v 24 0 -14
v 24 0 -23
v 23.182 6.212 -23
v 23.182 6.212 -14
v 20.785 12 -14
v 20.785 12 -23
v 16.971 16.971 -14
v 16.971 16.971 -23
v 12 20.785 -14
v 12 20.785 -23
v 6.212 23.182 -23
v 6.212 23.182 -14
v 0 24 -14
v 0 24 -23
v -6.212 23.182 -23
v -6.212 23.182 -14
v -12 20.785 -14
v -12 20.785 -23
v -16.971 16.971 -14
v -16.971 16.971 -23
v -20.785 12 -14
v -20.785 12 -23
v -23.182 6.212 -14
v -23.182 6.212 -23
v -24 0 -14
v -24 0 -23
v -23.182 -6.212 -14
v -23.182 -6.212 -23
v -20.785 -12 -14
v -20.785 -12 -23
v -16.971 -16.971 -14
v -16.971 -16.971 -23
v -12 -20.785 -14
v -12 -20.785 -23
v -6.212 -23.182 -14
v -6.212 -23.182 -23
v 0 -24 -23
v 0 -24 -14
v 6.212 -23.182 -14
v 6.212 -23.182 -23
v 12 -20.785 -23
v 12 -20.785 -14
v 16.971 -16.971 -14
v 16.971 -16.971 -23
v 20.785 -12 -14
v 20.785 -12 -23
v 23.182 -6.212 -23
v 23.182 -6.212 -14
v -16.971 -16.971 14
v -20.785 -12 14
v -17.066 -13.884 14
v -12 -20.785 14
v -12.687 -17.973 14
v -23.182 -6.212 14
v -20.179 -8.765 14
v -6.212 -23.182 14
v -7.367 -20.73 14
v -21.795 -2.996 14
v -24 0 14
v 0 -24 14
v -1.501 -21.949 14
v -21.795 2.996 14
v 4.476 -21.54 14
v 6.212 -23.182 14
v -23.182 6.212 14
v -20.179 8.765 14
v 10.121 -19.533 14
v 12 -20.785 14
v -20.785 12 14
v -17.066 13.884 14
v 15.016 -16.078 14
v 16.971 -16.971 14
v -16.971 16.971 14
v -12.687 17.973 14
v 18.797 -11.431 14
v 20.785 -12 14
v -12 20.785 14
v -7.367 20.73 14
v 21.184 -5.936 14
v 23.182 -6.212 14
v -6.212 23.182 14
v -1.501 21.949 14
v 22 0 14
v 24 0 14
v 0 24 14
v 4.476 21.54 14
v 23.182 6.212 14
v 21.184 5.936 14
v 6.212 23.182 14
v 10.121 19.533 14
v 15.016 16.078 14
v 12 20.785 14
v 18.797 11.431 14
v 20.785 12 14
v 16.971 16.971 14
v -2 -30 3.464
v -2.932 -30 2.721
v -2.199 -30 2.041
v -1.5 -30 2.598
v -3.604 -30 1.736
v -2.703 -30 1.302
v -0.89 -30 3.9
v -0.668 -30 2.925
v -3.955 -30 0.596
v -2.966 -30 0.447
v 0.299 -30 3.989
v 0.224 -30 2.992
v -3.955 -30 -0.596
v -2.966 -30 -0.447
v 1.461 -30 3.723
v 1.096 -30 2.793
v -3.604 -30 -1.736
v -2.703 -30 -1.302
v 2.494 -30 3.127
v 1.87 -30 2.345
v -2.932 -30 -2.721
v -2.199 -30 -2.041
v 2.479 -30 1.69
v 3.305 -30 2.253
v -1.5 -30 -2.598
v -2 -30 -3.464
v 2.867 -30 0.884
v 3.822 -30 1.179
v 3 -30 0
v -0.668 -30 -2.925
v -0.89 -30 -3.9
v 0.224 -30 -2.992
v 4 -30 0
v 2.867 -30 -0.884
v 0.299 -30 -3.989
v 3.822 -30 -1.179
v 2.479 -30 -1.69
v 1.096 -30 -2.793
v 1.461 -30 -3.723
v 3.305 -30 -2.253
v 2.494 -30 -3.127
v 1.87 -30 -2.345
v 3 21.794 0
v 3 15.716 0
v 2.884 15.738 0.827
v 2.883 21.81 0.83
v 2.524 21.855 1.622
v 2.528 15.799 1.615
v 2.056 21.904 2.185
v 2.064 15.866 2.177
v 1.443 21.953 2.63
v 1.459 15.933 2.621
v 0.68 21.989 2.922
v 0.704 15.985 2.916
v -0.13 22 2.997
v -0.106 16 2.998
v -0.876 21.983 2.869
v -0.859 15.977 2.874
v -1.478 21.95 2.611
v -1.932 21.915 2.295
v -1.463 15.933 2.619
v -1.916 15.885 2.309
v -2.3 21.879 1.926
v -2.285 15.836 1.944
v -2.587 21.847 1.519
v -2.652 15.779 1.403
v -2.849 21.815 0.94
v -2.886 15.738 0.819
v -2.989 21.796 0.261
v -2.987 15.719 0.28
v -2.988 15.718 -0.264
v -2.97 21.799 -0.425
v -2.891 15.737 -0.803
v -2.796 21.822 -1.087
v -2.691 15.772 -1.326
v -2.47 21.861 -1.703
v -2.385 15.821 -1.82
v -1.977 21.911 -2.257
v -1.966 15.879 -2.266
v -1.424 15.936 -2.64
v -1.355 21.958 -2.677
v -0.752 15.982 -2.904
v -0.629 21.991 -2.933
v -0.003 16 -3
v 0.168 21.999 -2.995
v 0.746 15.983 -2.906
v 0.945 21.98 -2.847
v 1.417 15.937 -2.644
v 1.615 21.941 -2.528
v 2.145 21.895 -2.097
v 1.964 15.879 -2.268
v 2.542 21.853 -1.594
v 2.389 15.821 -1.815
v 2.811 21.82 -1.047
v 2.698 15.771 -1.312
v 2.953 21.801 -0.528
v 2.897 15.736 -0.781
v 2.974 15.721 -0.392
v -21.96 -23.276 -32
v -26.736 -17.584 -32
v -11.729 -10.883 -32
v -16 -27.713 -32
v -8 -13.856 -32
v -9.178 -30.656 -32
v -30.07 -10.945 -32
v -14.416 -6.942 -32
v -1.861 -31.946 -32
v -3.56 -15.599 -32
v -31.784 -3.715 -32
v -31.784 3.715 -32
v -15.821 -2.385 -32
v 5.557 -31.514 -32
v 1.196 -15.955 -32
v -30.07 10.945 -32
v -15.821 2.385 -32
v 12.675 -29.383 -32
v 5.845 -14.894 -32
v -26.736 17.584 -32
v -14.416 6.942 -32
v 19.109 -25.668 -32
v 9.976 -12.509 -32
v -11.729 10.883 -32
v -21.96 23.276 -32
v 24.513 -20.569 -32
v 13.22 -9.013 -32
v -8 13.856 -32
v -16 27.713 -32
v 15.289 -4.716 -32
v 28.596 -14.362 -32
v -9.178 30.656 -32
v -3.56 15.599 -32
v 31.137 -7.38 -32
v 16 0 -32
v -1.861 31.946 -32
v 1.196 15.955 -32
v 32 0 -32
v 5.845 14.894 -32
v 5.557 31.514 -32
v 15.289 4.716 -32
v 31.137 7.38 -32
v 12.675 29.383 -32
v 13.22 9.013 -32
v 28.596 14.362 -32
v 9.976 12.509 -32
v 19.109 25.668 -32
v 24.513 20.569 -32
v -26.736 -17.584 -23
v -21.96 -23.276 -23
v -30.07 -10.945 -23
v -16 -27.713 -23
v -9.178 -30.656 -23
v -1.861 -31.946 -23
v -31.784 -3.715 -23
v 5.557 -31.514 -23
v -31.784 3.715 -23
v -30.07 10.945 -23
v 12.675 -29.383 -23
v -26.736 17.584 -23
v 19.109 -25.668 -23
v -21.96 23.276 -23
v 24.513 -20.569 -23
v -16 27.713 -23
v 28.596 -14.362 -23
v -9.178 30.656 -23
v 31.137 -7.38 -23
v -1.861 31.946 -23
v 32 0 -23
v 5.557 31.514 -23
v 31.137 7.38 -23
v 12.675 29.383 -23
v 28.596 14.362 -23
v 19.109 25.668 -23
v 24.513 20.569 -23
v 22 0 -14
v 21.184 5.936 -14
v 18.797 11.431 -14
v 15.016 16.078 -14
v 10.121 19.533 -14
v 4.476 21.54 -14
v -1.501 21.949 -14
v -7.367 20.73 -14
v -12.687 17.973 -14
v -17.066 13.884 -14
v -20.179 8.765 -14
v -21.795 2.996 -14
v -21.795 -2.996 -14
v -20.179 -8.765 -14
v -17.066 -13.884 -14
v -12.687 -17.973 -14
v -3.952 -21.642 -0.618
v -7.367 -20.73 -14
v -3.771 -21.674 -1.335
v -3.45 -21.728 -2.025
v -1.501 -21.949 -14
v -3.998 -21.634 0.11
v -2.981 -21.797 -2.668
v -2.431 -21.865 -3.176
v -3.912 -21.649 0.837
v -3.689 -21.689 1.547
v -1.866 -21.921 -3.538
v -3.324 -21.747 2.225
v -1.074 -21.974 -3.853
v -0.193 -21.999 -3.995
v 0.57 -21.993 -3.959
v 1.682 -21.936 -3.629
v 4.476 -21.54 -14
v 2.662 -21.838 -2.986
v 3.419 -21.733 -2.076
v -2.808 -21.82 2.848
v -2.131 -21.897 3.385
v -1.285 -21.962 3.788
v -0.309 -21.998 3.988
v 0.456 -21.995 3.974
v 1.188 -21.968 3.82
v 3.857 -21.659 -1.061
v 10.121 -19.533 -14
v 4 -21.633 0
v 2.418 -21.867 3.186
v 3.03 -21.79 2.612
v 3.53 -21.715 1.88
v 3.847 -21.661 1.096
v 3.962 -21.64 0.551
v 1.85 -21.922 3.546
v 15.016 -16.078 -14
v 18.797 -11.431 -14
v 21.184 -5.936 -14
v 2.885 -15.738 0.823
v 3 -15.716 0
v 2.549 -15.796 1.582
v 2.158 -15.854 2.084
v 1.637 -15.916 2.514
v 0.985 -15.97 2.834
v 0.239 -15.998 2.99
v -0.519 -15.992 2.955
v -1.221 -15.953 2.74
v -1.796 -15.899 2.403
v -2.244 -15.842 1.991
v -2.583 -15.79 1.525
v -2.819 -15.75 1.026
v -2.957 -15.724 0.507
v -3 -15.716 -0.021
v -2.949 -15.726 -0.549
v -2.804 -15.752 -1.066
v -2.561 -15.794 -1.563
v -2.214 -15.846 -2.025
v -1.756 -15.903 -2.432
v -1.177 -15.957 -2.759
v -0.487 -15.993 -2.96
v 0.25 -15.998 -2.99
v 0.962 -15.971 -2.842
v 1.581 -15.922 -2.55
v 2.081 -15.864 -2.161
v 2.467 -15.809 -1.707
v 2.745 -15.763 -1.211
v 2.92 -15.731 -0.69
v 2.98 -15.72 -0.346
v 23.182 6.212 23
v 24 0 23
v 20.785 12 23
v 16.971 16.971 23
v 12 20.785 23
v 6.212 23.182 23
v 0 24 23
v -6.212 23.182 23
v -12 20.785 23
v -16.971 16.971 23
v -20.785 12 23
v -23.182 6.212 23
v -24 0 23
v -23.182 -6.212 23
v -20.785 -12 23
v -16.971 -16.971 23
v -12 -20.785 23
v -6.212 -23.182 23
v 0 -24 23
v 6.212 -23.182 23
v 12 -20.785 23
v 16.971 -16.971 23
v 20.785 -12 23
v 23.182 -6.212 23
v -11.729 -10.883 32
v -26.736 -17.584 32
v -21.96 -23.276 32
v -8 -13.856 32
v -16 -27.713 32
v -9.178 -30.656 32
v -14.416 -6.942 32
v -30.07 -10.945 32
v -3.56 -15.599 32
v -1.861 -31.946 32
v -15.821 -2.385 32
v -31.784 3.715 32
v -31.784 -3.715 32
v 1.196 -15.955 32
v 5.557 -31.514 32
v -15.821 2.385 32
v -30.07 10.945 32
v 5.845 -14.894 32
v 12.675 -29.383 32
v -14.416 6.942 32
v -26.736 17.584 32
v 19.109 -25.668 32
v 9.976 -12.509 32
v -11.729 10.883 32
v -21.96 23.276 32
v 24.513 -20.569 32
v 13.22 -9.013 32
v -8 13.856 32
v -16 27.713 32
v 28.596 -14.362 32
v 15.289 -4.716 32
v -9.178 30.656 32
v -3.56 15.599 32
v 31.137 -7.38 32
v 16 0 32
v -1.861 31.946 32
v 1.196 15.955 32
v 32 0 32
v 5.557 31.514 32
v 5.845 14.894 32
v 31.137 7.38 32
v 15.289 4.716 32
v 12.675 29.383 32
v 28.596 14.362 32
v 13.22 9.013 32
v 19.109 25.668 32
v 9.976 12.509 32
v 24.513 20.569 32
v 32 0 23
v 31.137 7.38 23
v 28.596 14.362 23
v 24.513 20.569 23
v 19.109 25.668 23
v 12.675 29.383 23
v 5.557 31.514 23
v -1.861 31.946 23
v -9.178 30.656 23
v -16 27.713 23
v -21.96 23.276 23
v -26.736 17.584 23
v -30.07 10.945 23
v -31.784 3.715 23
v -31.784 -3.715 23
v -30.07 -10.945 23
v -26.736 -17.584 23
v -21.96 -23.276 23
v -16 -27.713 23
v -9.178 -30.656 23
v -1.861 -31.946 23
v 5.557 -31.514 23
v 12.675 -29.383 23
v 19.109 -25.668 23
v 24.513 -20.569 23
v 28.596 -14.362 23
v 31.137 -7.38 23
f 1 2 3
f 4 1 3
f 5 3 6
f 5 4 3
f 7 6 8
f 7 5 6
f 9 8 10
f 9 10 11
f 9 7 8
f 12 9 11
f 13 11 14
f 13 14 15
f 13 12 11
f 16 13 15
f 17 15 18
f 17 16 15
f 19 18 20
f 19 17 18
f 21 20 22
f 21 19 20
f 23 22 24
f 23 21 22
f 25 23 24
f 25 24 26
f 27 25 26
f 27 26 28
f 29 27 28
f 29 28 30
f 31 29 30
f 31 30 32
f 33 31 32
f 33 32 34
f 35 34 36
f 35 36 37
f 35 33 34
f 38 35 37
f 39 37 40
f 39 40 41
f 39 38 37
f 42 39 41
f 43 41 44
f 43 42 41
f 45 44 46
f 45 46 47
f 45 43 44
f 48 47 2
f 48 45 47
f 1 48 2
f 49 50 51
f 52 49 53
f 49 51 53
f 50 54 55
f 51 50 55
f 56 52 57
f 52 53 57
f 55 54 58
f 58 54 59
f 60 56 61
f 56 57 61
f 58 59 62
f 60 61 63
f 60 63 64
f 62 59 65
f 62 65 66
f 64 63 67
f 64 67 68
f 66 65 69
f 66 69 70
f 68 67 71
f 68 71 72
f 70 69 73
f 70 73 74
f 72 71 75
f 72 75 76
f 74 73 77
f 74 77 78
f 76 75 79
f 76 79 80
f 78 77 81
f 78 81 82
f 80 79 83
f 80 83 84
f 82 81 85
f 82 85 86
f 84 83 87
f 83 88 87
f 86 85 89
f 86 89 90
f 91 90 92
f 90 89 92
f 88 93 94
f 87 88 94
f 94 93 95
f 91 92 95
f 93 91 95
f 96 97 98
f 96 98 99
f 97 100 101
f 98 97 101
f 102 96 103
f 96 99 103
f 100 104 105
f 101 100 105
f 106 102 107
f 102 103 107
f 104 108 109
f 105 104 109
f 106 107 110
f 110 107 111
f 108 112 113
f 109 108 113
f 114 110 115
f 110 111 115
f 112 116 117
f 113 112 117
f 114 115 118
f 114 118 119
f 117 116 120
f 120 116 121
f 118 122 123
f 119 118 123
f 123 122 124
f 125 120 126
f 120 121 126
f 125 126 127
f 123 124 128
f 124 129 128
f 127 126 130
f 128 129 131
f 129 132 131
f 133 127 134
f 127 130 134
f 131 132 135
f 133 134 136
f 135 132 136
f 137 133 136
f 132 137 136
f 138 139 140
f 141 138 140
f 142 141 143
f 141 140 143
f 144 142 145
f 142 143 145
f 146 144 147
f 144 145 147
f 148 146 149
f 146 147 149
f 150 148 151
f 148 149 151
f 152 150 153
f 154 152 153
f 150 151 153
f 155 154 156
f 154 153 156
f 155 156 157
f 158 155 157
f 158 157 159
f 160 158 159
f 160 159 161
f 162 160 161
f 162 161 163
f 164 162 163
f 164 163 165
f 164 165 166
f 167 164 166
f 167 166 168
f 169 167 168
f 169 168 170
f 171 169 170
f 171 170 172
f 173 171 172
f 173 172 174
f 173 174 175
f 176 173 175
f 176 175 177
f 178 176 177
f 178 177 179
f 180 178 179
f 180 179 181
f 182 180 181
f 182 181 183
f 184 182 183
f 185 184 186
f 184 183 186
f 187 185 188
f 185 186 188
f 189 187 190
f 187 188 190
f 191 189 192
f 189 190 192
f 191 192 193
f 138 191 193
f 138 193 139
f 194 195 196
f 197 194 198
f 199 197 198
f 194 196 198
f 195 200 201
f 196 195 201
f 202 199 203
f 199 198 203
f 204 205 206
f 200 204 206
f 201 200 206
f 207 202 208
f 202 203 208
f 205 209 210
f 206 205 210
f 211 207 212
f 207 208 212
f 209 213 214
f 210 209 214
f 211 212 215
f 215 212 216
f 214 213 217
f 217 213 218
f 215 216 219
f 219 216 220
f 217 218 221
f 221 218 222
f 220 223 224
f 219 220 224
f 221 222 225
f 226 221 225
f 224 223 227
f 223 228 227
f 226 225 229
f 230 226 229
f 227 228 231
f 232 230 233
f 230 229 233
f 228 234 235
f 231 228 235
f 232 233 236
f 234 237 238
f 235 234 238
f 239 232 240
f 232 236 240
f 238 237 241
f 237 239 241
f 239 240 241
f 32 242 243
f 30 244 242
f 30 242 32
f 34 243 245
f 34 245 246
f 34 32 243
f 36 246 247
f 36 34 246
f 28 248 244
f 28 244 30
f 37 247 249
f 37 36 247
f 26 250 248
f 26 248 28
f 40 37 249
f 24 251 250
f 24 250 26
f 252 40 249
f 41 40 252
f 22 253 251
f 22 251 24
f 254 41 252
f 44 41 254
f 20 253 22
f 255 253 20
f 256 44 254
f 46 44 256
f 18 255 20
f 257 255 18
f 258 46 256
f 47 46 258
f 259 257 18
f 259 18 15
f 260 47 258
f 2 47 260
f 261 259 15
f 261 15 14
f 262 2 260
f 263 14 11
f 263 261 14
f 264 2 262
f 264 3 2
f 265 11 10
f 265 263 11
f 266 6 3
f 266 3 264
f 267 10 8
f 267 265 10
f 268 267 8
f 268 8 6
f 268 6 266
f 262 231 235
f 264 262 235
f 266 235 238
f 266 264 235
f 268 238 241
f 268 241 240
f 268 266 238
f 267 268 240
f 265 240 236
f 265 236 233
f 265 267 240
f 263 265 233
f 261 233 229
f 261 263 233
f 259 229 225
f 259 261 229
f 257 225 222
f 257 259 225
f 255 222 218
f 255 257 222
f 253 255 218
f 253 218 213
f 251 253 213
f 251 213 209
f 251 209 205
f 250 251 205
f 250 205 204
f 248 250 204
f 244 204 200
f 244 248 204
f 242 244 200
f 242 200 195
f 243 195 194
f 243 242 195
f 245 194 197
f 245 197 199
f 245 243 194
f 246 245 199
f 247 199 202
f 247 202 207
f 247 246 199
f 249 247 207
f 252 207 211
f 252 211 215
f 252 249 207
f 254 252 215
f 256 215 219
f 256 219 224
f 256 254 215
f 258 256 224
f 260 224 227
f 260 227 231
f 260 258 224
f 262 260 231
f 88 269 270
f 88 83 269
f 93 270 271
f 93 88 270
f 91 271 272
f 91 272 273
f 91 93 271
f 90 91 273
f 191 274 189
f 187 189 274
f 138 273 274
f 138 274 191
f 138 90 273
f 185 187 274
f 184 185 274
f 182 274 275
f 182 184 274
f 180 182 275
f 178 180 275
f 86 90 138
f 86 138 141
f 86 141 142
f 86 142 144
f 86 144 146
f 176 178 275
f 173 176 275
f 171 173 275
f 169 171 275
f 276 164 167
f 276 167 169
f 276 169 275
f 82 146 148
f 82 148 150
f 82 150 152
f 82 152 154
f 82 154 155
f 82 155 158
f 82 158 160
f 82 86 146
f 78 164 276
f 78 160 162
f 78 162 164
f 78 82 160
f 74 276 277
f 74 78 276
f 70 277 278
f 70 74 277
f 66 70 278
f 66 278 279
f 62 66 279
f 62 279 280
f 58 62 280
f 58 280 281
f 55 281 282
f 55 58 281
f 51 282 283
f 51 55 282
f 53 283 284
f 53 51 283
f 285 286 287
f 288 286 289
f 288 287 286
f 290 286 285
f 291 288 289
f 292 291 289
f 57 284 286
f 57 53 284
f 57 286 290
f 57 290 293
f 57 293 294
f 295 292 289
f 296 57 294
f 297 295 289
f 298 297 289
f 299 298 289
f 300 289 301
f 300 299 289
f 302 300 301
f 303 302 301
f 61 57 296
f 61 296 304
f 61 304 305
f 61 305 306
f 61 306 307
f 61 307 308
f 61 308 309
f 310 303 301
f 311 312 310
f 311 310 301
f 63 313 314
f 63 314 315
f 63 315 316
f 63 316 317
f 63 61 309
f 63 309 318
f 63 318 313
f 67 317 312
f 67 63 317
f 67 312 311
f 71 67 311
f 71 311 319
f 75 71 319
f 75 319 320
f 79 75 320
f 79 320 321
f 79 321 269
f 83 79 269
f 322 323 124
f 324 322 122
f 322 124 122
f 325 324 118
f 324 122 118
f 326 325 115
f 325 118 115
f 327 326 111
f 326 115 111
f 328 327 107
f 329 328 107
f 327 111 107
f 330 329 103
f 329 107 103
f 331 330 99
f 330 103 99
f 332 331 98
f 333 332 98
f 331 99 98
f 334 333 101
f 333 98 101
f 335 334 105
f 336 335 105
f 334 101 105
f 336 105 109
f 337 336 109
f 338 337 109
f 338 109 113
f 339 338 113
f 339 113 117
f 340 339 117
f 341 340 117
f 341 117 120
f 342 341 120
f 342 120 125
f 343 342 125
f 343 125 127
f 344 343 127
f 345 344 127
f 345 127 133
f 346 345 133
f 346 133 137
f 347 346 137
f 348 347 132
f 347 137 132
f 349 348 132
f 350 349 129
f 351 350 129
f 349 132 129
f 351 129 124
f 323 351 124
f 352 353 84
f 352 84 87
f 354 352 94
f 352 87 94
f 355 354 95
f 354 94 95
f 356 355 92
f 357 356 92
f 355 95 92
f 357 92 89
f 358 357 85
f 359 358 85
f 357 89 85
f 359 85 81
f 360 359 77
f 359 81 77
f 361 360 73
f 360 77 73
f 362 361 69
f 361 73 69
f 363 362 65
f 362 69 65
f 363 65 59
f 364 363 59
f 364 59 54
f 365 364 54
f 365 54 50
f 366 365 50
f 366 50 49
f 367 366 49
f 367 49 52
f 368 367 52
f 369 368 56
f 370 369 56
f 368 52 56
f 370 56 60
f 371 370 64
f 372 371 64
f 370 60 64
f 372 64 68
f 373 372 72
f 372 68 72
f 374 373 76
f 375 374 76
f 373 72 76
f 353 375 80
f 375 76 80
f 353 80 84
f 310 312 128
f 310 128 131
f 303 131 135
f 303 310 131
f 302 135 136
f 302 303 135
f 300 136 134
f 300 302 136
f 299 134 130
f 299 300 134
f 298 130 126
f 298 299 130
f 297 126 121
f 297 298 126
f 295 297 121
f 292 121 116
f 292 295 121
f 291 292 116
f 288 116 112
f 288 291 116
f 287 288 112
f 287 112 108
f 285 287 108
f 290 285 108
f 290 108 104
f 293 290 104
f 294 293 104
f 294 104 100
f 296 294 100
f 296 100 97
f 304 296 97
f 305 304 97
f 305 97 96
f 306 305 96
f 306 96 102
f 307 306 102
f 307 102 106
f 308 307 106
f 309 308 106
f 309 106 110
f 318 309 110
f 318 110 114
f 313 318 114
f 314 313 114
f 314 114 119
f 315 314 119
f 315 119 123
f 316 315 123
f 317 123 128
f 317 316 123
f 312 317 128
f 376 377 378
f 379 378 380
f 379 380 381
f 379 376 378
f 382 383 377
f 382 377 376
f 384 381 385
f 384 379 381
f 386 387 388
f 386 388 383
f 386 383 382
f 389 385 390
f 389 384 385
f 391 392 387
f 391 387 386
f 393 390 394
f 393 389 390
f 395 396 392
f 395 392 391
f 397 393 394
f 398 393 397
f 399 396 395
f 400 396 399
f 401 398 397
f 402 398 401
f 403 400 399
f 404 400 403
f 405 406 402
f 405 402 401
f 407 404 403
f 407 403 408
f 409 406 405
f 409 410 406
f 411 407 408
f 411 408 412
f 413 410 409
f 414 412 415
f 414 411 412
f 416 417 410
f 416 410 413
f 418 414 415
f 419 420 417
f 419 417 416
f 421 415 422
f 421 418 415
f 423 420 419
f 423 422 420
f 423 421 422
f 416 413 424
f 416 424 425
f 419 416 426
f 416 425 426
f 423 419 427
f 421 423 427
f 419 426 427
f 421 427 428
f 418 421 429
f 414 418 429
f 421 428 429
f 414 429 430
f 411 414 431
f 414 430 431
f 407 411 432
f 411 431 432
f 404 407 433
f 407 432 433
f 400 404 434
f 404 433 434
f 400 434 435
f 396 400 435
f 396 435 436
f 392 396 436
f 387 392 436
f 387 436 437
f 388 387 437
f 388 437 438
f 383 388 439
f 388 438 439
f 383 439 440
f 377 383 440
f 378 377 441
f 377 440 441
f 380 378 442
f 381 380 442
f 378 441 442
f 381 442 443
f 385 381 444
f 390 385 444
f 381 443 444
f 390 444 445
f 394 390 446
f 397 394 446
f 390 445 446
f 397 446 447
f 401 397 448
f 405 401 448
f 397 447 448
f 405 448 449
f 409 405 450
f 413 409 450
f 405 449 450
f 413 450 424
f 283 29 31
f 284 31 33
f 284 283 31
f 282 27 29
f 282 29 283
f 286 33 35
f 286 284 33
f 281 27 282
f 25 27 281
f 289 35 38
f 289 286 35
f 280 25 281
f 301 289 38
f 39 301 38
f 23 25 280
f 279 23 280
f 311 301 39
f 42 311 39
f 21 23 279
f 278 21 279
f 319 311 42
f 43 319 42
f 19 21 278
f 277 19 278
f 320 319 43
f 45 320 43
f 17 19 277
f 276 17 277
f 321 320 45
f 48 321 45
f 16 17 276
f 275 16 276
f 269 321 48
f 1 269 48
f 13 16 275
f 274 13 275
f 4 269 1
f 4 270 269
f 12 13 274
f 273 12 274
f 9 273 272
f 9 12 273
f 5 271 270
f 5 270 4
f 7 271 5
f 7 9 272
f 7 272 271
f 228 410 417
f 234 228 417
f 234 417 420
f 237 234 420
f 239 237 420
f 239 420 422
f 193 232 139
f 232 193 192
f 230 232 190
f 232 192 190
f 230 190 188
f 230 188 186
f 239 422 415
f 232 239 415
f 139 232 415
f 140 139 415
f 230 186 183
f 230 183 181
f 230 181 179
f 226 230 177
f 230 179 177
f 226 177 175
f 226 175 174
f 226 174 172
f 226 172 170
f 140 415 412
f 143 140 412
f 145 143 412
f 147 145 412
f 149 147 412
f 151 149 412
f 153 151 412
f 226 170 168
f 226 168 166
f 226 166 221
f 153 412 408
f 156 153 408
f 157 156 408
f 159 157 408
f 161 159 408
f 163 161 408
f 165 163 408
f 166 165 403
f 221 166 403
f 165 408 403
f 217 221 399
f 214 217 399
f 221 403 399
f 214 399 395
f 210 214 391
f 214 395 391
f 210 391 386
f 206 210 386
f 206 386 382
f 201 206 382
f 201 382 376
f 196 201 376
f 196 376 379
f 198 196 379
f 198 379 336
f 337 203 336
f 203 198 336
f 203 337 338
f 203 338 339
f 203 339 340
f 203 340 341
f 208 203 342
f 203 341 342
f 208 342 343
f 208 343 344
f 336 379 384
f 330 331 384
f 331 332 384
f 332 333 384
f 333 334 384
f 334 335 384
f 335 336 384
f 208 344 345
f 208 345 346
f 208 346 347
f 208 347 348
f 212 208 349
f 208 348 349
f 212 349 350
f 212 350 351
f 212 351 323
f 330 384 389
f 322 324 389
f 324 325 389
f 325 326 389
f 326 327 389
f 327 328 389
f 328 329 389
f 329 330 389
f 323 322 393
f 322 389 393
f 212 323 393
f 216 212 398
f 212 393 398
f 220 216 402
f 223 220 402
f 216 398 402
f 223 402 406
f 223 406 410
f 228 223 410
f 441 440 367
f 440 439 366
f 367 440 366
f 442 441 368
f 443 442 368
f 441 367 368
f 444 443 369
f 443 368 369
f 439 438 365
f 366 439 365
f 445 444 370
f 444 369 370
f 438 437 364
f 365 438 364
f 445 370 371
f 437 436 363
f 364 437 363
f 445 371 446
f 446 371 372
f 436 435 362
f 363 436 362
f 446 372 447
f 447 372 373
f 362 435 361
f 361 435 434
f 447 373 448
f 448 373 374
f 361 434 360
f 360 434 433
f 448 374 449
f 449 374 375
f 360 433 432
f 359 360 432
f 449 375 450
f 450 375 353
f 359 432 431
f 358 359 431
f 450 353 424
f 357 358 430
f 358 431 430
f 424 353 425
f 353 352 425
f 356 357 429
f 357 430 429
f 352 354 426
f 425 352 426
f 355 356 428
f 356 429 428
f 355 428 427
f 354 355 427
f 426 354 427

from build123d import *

# Parameters (mm, degrees)
SKETCH1_R           = 22
BOSS_EXTRUDE1_DEPTH = 14
SKETCH2_R           = 24
BOSS_EXTRUDE2_DEPTH = 9
SKETCH3_R           = 32
BOSS_EXTRUDE3_DEPTH = 9
SKETCH5_R           = 4
BOSS_EXTRUDE4_DEPTH = 30
CUT_EXTRUDE2_REACH  = 66
SKETCH4_R           = 16
SKETCH6_R           = 3
CUT_EXTRUDE3_DEPTH  = 63


with BuildPart() as part:
    # Sketch1 → Boss-Extrude1 (new body, symmetric)
    with BuildSketch(Plane.XY):
        Circle(SKETCH1_R)
    extrude(amount=BOSS_EXTRUDE1_DEPTH, both=True)

    # Sketch2 → Boss-Extrude2 (add)
    with BuildSketch(Plane.XY.offset(14)):
        Circle(SKETCH2_R)
    boss_extrude2 = extrude(amount=BOSS_EXTRUDE2_DEPTH)

    # Mirror1: Boss-Extrude2 across plane
    add(boss_extrude2.mirror(Plane.XY))

    # Sketch3 → Boss-Extrude3 (add)
    with BuildSketch(Plane.XY.offset(23)):
        Circle(SKETCH3_R)
    boss_extrude3 = extrude(amount=BOSS_EXTRUDE3_DEPTH)

    # Mirror2: Boss-Extrude3 across plane
    add(boss_extrude3.mirror(Plane.XY))

    # Sketch5 → Boss-Extrude4 (add)
    with BuildSketch(Plane(origin=(0, 0, 0), x_dir=(1, 0, 0), z_dir=(0, 1, 0))):
        Circle(SKETCH5_R)
    extrude(amount=-BOSS_EXTRUDE4_DEPTH)

    # Sketch4 → Cut-Extrude2 (cut, up to next)
    with BuildSketch(Plane.XY.offset(32), mode=Mode.PRIVATE) as cut_extrude2_sk1:
        Circle(SKETCH4_R)
    cut_extrude2_tool1 = extrude(cut_extrude2_sk1.sketch, amount=-CUT_EXTRUDE2_REACH, mode=Mode.PRIVATE) & part.part
    add(cut_extrude2_tool1.solids().sort_by_distance((0, 0, 32))[0], mode=Mode.SUBTRACT)

    # Sketch6 → Cut-Extrude3 (cut, through all)
    with BuildSketch(Plane.XZ.offset(30)):
        Circle(SKETCH6_R)
    extrude(amount=-CUT_EXTRUDE3_DEPTH, mode=Mode.SUBTRACT)


solid = part.part
